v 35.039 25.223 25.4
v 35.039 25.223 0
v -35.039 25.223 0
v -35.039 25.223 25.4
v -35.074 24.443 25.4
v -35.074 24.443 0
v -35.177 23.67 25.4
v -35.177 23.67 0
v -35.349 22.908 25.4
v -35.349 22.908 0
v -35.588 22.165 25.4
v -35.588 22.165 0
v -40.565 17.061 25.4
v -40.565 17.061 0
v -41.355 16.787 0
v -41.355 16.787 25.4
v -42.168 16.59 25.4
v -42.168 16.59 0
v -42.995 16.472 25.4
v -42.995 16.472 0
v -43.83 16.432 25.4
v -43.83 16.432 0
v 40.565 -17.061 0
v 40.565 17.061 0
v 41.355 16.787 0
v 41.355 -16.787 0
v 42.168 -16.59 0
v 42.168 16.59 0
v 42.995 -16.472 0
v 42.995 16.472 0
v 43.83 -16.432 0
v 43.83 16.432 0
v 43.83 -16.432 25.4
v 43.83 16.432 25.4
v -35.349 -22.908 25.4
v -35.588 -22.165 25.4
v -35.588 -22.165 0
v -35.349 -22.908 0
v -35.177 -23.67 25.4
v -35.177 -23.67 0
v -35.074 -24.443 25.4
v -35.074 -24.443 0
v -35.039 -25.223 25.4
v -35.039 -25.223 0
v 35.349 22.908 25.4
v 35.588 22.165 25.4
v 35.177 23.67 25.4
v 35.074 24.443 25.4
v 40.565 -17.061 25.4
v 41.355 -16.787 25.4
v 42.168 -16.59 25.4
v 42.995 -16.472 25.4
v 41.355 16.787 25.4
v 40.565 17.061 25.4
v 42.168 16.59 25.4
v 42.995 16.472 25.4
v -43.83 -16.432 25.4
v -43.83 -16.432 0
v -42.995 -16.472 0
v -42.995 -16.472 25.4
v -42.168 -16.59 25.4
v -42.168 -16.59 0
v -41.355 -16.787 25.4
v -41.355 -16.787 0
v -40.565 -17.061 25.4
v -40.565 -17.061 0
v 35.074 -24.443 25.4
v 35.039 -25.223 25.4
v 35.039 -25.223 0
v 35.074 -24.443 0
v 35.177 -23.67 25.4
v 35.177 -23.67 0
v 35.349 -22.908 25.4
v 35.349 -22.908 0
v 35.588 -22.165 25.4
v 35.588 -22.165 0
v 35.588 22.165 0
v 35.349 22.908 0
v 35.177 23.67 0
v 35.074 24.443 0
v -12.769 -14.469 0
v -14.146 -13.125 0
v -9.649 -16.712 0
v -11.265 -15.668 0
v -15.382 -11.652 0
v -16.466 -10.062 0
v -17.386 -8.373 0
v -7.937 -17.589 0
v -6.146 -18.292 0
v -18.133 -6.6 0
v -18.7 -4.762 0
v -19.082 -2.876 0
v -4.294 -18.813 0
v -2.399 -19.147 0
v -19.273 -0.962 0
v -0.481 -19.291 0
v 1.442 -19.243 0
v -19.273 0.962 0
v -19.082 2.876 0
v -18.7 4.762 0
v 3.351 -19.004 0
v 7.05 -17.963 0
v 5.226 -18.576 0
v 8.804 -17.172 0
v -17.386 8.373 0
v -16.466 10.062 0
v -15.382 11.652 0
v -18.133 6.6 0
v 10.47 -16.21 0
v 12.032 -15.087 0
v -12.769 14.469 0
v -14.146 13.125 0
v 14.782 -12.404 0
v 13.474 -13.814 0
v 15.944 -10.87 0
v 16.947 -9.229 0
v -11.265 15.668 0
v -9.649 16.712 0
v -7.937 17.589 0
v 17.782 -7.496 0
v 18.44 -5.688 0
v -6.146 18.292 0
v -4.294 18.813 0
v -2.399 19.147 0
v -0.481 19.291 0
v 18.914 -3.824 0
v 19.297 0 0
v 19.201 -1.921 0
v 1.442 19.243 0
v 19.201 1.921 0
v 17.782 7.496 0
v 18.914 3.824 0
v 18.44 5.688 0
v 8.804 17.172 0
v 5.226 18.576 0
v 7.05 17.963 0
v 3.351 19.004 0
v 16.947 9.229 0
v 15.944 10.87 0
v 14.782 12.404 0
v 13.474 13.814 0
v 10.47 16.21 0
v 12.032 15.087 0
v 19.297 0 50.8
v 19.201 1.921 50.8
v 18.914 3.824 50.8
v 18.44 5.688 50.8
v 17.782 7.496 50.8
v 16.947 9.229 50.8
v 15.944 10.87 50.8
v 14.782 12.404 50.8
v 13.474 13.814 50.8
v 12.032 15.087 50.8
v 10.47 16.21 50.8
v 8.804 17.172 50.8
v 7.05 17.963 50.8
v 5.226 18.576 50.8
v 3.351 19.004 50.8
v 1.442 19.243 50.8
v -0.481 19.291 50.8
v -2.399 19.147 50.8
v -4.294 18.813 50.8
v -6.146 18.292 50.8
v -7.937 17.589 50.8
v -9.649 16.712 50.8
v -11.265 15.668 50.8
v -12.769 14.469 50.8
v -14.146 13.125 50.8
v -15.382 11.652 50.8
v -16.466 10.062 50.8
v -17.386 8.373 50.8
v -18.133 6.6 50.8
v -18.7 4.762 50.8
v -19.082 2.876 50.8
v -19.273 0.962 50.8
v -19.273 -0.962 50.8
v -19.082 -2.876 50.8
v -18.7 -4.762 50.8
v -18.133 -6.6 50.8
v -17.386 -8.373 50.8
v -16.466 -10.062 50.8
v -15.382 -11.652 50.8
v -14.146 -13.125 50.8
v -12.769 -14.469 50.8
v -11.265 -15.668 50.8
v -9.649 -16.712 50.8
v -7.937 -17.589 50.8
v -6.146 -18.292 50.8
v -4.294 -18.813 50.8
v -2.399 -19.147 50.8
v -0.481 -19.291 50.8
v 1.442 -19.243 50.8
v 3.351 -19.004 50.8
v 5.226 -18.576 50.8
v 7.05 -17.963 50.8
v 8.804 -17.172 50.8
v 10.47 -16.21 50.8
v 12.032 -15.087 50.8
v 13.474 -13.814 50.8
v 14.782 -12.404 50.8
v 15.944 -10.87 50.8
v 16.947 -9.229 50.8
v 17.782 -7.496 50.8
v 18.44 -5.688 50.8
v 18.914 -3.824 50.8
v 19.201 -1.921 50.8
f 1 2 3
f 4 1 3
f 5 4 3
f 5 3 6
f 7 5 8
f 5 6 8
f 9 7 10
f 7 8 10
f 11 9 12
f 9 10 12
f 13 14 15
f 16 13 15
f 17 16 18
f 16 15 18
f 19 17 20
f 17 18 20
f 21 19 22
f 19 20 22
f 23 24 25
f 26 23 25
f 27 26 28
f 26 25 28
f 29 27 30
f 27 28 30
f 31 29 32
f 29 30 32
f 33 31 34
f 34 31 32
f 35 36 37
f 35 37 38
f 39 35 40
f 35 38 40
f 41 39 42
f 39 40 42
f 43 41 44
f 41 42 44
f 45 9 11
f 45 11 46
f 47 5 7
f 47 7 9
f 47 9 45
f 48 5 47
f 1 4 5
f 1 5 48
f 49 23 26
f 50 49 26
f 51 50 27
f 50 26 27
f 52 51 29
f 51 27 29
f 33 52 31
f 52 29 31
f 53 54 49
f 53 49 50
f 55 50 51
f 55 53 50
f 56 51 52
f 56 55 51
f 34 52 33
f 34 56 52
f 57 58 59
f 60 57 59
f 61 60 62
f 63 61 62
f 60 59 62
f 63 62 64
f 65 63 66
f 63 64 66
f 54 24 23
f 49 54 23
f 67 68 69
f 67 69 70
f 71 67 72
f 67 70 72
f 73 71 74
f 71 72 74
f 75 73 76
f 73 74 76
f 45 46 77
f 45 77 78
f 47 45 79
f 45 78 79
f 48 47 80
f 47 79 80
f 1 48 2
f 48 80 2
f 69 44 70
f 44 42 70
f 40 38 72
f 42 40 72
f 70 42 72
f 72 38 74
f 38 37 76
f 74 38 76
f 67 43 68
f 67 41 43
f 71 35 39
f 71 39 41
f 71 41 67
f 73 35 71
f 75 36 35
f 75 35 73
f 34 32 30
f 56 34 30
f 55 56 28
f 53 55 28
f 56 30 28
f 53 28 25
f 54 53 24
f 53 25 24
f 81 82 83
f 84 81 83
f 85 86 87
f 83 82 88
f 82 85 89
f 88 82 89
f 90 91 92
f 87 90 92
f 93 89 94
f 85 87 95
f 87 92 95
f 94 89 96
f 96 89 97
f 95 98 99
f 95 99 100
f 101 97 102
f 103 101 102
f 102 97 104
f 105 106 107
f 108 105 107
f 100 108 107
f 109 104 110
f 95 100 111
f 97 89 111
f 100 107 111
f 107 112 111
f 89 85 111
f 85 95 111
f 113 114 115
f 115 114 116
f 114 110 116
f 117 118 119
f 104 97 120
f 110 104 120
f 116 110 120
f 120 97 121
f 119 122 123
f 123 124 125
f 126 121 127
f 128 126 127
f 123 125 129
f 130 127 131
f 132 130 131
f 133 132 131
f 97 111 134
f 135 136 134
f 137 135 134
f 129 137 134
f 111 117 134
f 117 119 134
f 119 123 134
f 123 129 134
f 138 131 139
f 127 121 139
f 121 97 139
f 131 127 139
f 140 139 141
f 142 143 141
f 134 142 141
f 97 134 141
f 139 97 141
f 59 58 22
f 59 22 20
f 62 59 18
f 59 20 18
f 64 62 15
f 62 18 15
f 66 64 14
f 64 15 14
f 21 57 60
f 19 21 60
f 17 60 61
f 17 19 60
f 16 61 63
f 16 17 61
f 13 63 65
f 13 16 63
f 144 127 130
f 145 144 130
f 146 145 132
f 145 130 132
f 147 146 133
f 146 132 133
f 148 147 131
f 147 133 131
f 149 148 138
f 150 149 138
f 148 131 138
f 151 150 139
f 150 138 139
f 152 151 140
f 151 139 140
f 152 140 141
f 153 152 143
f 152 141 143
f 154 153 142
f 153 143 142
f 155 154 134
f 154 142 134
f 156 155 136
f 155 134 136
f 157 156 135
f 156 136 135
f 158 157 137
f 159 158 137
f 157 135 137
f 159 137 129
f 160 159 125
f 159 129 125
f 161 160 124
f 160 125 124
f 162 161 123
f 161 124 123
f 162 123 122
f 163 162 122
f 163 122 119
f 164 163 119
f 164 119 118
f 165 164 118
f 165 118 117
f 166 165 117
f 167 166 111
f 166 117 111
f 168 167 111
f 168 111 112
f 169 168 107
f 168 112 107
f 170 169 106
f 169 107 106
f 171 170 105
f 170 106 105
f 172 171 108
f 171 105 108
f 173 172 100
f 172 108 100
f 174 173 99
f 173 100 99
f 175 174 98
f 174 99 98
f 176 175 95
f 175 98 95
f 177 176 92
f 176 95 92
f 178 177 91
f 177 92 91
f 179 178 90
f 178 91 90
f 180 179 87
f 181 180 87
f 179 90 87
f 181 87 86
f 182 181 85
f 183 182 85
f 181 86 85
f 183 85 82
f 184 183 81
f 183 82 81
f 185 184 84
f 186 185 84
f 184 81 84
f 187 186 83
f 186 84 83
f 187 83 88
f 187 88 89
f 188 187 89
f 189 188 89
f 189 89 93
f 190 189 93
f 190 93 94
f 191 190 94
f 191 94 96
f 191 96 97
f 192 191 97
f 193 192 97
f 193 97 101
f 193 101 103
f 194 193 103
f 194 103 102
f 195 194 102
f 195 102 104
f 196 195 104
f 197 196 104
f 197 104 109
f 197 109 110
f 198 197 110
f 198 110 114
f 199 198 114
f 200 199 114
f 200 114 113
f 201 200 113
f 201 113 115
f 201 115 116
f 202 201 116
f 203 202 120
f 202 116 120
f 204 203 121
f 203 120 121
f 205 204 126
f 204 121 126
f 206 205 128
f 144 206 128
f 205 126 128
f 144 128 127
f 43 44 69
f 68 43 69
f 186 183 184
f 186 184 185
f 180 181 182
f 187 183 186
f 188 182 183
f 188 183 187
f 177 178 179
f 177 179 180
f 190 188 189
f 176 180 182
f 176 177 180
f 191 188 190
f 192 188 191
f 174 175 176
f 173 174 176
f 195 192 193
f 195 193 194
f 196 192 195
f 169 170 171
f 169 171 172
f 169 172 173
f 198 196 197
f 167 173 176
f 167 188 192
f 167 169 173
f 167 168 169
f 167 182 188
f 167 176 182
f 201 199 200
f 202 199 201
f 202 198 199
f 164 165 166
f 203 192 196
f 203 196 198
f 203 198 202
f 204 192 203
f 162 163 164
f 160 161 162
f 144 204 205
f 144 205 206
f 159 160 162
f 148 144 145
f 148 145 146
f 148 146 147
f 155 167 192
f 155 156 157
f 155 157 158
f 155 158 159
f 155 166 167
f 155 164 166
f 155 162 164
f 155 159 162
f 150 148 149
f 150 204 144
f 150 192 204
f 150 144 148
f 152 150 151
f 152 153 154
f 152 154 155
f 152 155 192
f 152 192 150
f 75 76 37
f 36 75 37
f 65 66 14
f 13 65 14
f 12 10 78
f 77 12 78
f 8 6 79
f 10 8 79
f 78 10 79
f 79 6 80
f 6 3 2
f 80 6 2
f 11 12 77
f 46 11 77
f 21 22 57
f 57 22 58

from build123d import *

# Parameters (mm, degrees)
F1_DEPTH = 25.4
F0_R     = 19.2971097636
F3_DEPTH = 50.8


# Not quite as in the source:
# - the program builds the solid bodies; features that only make, move or delete a surface that nothing else refers to are left out


with BuildPart() as f1:
    # F0 (on Top) → F1 (new body)
    with BuildSketch(Plane.XY):
        with BuildLine():
            Line((35.0388884567, 25.2227913588), (-35.0388884567, 25.2227913588))
            ThreePointArc((-35.0388884567, 25.2227913588), (-35.1771760377, 23.6696604158), (-35.5876880321, 22.1653934568))
            Line((-35.5876880321, 22.1653934568), (35.5876880321, 22.1653934568))
            ThreePointArc((35.5876880321, 22.1653934568), (35.1771760377, 23.6696604158), (35.0388884567, 25.2227913588))
        make_face()
    extrude(amount=F1_DEPTH)


with BuildPart() as f1b:
    # F0 (on Top) → F1, piece 2 (new body)
    with BuildSketch(Plane.XY):
        with BuildLine():
            Line((40.5652746558, 17.0605210708), (40.5652746558, -17.0605210708))
            ThreePointArc((40.5652746558, -17.0605210708), (42.1675359576, -16.590493834), (43.8297688961, -16.4319109195))
            Line((43.8297688961, -16.4319109195), (43.8297688961, 16.4319109195))
            ThreePointArc((43.8297688961, 16.4319109195), (42.1675359576, 16.590493834), (40.5652746558, 17.0605210708))
        make_face()
    extrude(amount=F1_DEPTH)


with BuildPart() as f1c:
    # F0 (on Top) → F1, piece 3 (new body)
    with BuildSketch(Plane.XY):
        with BuildLine():
            Line((-43.8297688961, 16.4319109195), (-43.8297688961, -16.4319109195))
            ThreePointArc((-43.8297688961, -16.4319109195), (-42.1675359576, -16.590493834), (-40.5652746558, -17.0605210708))
            Line((-40.5652746558, -17.0605210708), (-40.5652746558, 17.0605210708))
            ThreePointArc((-40.5652746558, 17.0605210708), (-42.1675359576, 16.590493834), (-43.8297688961, 16.4319109195))
        make_face()
    extrude(amount=F1_DEPTH)


with BuildPart() as f1d:
    # F0 (on Top) → F1, piece 4 (new body)
    with BuildSketch(Plane.XY):
        with BuildLine():
            Line((-35.0388884567, -25.2227913588), (35.0388884567, -25.2227913588))
            ThreePointArc((35.0388884567, -25.2227913588), (35.1771760377, -23.6696604158), (35.5876880321, -22.1653934568))
            Line((35.5876880321, -22.1653934568), (-35.5876880321, -22.1653934568))
            ThreePointArc((-35.5876880321, -22.1653934568), (-35.1771760377, -23.6696604158), (-35.0388884567, -25.2227913588))
        make_face()
    extrude(amount=F1_DEPTH)


with BuildPart() as f3:
    # F0 (on Top) → F3 (new body)
    with BuildSketch(Plane.XY):
        Circle(F0_R)
    extrude(amount=F3_DEPTH)


solid = Compound([f1.part, f1b.part, f1c.part, f1d.part, f3.part])
